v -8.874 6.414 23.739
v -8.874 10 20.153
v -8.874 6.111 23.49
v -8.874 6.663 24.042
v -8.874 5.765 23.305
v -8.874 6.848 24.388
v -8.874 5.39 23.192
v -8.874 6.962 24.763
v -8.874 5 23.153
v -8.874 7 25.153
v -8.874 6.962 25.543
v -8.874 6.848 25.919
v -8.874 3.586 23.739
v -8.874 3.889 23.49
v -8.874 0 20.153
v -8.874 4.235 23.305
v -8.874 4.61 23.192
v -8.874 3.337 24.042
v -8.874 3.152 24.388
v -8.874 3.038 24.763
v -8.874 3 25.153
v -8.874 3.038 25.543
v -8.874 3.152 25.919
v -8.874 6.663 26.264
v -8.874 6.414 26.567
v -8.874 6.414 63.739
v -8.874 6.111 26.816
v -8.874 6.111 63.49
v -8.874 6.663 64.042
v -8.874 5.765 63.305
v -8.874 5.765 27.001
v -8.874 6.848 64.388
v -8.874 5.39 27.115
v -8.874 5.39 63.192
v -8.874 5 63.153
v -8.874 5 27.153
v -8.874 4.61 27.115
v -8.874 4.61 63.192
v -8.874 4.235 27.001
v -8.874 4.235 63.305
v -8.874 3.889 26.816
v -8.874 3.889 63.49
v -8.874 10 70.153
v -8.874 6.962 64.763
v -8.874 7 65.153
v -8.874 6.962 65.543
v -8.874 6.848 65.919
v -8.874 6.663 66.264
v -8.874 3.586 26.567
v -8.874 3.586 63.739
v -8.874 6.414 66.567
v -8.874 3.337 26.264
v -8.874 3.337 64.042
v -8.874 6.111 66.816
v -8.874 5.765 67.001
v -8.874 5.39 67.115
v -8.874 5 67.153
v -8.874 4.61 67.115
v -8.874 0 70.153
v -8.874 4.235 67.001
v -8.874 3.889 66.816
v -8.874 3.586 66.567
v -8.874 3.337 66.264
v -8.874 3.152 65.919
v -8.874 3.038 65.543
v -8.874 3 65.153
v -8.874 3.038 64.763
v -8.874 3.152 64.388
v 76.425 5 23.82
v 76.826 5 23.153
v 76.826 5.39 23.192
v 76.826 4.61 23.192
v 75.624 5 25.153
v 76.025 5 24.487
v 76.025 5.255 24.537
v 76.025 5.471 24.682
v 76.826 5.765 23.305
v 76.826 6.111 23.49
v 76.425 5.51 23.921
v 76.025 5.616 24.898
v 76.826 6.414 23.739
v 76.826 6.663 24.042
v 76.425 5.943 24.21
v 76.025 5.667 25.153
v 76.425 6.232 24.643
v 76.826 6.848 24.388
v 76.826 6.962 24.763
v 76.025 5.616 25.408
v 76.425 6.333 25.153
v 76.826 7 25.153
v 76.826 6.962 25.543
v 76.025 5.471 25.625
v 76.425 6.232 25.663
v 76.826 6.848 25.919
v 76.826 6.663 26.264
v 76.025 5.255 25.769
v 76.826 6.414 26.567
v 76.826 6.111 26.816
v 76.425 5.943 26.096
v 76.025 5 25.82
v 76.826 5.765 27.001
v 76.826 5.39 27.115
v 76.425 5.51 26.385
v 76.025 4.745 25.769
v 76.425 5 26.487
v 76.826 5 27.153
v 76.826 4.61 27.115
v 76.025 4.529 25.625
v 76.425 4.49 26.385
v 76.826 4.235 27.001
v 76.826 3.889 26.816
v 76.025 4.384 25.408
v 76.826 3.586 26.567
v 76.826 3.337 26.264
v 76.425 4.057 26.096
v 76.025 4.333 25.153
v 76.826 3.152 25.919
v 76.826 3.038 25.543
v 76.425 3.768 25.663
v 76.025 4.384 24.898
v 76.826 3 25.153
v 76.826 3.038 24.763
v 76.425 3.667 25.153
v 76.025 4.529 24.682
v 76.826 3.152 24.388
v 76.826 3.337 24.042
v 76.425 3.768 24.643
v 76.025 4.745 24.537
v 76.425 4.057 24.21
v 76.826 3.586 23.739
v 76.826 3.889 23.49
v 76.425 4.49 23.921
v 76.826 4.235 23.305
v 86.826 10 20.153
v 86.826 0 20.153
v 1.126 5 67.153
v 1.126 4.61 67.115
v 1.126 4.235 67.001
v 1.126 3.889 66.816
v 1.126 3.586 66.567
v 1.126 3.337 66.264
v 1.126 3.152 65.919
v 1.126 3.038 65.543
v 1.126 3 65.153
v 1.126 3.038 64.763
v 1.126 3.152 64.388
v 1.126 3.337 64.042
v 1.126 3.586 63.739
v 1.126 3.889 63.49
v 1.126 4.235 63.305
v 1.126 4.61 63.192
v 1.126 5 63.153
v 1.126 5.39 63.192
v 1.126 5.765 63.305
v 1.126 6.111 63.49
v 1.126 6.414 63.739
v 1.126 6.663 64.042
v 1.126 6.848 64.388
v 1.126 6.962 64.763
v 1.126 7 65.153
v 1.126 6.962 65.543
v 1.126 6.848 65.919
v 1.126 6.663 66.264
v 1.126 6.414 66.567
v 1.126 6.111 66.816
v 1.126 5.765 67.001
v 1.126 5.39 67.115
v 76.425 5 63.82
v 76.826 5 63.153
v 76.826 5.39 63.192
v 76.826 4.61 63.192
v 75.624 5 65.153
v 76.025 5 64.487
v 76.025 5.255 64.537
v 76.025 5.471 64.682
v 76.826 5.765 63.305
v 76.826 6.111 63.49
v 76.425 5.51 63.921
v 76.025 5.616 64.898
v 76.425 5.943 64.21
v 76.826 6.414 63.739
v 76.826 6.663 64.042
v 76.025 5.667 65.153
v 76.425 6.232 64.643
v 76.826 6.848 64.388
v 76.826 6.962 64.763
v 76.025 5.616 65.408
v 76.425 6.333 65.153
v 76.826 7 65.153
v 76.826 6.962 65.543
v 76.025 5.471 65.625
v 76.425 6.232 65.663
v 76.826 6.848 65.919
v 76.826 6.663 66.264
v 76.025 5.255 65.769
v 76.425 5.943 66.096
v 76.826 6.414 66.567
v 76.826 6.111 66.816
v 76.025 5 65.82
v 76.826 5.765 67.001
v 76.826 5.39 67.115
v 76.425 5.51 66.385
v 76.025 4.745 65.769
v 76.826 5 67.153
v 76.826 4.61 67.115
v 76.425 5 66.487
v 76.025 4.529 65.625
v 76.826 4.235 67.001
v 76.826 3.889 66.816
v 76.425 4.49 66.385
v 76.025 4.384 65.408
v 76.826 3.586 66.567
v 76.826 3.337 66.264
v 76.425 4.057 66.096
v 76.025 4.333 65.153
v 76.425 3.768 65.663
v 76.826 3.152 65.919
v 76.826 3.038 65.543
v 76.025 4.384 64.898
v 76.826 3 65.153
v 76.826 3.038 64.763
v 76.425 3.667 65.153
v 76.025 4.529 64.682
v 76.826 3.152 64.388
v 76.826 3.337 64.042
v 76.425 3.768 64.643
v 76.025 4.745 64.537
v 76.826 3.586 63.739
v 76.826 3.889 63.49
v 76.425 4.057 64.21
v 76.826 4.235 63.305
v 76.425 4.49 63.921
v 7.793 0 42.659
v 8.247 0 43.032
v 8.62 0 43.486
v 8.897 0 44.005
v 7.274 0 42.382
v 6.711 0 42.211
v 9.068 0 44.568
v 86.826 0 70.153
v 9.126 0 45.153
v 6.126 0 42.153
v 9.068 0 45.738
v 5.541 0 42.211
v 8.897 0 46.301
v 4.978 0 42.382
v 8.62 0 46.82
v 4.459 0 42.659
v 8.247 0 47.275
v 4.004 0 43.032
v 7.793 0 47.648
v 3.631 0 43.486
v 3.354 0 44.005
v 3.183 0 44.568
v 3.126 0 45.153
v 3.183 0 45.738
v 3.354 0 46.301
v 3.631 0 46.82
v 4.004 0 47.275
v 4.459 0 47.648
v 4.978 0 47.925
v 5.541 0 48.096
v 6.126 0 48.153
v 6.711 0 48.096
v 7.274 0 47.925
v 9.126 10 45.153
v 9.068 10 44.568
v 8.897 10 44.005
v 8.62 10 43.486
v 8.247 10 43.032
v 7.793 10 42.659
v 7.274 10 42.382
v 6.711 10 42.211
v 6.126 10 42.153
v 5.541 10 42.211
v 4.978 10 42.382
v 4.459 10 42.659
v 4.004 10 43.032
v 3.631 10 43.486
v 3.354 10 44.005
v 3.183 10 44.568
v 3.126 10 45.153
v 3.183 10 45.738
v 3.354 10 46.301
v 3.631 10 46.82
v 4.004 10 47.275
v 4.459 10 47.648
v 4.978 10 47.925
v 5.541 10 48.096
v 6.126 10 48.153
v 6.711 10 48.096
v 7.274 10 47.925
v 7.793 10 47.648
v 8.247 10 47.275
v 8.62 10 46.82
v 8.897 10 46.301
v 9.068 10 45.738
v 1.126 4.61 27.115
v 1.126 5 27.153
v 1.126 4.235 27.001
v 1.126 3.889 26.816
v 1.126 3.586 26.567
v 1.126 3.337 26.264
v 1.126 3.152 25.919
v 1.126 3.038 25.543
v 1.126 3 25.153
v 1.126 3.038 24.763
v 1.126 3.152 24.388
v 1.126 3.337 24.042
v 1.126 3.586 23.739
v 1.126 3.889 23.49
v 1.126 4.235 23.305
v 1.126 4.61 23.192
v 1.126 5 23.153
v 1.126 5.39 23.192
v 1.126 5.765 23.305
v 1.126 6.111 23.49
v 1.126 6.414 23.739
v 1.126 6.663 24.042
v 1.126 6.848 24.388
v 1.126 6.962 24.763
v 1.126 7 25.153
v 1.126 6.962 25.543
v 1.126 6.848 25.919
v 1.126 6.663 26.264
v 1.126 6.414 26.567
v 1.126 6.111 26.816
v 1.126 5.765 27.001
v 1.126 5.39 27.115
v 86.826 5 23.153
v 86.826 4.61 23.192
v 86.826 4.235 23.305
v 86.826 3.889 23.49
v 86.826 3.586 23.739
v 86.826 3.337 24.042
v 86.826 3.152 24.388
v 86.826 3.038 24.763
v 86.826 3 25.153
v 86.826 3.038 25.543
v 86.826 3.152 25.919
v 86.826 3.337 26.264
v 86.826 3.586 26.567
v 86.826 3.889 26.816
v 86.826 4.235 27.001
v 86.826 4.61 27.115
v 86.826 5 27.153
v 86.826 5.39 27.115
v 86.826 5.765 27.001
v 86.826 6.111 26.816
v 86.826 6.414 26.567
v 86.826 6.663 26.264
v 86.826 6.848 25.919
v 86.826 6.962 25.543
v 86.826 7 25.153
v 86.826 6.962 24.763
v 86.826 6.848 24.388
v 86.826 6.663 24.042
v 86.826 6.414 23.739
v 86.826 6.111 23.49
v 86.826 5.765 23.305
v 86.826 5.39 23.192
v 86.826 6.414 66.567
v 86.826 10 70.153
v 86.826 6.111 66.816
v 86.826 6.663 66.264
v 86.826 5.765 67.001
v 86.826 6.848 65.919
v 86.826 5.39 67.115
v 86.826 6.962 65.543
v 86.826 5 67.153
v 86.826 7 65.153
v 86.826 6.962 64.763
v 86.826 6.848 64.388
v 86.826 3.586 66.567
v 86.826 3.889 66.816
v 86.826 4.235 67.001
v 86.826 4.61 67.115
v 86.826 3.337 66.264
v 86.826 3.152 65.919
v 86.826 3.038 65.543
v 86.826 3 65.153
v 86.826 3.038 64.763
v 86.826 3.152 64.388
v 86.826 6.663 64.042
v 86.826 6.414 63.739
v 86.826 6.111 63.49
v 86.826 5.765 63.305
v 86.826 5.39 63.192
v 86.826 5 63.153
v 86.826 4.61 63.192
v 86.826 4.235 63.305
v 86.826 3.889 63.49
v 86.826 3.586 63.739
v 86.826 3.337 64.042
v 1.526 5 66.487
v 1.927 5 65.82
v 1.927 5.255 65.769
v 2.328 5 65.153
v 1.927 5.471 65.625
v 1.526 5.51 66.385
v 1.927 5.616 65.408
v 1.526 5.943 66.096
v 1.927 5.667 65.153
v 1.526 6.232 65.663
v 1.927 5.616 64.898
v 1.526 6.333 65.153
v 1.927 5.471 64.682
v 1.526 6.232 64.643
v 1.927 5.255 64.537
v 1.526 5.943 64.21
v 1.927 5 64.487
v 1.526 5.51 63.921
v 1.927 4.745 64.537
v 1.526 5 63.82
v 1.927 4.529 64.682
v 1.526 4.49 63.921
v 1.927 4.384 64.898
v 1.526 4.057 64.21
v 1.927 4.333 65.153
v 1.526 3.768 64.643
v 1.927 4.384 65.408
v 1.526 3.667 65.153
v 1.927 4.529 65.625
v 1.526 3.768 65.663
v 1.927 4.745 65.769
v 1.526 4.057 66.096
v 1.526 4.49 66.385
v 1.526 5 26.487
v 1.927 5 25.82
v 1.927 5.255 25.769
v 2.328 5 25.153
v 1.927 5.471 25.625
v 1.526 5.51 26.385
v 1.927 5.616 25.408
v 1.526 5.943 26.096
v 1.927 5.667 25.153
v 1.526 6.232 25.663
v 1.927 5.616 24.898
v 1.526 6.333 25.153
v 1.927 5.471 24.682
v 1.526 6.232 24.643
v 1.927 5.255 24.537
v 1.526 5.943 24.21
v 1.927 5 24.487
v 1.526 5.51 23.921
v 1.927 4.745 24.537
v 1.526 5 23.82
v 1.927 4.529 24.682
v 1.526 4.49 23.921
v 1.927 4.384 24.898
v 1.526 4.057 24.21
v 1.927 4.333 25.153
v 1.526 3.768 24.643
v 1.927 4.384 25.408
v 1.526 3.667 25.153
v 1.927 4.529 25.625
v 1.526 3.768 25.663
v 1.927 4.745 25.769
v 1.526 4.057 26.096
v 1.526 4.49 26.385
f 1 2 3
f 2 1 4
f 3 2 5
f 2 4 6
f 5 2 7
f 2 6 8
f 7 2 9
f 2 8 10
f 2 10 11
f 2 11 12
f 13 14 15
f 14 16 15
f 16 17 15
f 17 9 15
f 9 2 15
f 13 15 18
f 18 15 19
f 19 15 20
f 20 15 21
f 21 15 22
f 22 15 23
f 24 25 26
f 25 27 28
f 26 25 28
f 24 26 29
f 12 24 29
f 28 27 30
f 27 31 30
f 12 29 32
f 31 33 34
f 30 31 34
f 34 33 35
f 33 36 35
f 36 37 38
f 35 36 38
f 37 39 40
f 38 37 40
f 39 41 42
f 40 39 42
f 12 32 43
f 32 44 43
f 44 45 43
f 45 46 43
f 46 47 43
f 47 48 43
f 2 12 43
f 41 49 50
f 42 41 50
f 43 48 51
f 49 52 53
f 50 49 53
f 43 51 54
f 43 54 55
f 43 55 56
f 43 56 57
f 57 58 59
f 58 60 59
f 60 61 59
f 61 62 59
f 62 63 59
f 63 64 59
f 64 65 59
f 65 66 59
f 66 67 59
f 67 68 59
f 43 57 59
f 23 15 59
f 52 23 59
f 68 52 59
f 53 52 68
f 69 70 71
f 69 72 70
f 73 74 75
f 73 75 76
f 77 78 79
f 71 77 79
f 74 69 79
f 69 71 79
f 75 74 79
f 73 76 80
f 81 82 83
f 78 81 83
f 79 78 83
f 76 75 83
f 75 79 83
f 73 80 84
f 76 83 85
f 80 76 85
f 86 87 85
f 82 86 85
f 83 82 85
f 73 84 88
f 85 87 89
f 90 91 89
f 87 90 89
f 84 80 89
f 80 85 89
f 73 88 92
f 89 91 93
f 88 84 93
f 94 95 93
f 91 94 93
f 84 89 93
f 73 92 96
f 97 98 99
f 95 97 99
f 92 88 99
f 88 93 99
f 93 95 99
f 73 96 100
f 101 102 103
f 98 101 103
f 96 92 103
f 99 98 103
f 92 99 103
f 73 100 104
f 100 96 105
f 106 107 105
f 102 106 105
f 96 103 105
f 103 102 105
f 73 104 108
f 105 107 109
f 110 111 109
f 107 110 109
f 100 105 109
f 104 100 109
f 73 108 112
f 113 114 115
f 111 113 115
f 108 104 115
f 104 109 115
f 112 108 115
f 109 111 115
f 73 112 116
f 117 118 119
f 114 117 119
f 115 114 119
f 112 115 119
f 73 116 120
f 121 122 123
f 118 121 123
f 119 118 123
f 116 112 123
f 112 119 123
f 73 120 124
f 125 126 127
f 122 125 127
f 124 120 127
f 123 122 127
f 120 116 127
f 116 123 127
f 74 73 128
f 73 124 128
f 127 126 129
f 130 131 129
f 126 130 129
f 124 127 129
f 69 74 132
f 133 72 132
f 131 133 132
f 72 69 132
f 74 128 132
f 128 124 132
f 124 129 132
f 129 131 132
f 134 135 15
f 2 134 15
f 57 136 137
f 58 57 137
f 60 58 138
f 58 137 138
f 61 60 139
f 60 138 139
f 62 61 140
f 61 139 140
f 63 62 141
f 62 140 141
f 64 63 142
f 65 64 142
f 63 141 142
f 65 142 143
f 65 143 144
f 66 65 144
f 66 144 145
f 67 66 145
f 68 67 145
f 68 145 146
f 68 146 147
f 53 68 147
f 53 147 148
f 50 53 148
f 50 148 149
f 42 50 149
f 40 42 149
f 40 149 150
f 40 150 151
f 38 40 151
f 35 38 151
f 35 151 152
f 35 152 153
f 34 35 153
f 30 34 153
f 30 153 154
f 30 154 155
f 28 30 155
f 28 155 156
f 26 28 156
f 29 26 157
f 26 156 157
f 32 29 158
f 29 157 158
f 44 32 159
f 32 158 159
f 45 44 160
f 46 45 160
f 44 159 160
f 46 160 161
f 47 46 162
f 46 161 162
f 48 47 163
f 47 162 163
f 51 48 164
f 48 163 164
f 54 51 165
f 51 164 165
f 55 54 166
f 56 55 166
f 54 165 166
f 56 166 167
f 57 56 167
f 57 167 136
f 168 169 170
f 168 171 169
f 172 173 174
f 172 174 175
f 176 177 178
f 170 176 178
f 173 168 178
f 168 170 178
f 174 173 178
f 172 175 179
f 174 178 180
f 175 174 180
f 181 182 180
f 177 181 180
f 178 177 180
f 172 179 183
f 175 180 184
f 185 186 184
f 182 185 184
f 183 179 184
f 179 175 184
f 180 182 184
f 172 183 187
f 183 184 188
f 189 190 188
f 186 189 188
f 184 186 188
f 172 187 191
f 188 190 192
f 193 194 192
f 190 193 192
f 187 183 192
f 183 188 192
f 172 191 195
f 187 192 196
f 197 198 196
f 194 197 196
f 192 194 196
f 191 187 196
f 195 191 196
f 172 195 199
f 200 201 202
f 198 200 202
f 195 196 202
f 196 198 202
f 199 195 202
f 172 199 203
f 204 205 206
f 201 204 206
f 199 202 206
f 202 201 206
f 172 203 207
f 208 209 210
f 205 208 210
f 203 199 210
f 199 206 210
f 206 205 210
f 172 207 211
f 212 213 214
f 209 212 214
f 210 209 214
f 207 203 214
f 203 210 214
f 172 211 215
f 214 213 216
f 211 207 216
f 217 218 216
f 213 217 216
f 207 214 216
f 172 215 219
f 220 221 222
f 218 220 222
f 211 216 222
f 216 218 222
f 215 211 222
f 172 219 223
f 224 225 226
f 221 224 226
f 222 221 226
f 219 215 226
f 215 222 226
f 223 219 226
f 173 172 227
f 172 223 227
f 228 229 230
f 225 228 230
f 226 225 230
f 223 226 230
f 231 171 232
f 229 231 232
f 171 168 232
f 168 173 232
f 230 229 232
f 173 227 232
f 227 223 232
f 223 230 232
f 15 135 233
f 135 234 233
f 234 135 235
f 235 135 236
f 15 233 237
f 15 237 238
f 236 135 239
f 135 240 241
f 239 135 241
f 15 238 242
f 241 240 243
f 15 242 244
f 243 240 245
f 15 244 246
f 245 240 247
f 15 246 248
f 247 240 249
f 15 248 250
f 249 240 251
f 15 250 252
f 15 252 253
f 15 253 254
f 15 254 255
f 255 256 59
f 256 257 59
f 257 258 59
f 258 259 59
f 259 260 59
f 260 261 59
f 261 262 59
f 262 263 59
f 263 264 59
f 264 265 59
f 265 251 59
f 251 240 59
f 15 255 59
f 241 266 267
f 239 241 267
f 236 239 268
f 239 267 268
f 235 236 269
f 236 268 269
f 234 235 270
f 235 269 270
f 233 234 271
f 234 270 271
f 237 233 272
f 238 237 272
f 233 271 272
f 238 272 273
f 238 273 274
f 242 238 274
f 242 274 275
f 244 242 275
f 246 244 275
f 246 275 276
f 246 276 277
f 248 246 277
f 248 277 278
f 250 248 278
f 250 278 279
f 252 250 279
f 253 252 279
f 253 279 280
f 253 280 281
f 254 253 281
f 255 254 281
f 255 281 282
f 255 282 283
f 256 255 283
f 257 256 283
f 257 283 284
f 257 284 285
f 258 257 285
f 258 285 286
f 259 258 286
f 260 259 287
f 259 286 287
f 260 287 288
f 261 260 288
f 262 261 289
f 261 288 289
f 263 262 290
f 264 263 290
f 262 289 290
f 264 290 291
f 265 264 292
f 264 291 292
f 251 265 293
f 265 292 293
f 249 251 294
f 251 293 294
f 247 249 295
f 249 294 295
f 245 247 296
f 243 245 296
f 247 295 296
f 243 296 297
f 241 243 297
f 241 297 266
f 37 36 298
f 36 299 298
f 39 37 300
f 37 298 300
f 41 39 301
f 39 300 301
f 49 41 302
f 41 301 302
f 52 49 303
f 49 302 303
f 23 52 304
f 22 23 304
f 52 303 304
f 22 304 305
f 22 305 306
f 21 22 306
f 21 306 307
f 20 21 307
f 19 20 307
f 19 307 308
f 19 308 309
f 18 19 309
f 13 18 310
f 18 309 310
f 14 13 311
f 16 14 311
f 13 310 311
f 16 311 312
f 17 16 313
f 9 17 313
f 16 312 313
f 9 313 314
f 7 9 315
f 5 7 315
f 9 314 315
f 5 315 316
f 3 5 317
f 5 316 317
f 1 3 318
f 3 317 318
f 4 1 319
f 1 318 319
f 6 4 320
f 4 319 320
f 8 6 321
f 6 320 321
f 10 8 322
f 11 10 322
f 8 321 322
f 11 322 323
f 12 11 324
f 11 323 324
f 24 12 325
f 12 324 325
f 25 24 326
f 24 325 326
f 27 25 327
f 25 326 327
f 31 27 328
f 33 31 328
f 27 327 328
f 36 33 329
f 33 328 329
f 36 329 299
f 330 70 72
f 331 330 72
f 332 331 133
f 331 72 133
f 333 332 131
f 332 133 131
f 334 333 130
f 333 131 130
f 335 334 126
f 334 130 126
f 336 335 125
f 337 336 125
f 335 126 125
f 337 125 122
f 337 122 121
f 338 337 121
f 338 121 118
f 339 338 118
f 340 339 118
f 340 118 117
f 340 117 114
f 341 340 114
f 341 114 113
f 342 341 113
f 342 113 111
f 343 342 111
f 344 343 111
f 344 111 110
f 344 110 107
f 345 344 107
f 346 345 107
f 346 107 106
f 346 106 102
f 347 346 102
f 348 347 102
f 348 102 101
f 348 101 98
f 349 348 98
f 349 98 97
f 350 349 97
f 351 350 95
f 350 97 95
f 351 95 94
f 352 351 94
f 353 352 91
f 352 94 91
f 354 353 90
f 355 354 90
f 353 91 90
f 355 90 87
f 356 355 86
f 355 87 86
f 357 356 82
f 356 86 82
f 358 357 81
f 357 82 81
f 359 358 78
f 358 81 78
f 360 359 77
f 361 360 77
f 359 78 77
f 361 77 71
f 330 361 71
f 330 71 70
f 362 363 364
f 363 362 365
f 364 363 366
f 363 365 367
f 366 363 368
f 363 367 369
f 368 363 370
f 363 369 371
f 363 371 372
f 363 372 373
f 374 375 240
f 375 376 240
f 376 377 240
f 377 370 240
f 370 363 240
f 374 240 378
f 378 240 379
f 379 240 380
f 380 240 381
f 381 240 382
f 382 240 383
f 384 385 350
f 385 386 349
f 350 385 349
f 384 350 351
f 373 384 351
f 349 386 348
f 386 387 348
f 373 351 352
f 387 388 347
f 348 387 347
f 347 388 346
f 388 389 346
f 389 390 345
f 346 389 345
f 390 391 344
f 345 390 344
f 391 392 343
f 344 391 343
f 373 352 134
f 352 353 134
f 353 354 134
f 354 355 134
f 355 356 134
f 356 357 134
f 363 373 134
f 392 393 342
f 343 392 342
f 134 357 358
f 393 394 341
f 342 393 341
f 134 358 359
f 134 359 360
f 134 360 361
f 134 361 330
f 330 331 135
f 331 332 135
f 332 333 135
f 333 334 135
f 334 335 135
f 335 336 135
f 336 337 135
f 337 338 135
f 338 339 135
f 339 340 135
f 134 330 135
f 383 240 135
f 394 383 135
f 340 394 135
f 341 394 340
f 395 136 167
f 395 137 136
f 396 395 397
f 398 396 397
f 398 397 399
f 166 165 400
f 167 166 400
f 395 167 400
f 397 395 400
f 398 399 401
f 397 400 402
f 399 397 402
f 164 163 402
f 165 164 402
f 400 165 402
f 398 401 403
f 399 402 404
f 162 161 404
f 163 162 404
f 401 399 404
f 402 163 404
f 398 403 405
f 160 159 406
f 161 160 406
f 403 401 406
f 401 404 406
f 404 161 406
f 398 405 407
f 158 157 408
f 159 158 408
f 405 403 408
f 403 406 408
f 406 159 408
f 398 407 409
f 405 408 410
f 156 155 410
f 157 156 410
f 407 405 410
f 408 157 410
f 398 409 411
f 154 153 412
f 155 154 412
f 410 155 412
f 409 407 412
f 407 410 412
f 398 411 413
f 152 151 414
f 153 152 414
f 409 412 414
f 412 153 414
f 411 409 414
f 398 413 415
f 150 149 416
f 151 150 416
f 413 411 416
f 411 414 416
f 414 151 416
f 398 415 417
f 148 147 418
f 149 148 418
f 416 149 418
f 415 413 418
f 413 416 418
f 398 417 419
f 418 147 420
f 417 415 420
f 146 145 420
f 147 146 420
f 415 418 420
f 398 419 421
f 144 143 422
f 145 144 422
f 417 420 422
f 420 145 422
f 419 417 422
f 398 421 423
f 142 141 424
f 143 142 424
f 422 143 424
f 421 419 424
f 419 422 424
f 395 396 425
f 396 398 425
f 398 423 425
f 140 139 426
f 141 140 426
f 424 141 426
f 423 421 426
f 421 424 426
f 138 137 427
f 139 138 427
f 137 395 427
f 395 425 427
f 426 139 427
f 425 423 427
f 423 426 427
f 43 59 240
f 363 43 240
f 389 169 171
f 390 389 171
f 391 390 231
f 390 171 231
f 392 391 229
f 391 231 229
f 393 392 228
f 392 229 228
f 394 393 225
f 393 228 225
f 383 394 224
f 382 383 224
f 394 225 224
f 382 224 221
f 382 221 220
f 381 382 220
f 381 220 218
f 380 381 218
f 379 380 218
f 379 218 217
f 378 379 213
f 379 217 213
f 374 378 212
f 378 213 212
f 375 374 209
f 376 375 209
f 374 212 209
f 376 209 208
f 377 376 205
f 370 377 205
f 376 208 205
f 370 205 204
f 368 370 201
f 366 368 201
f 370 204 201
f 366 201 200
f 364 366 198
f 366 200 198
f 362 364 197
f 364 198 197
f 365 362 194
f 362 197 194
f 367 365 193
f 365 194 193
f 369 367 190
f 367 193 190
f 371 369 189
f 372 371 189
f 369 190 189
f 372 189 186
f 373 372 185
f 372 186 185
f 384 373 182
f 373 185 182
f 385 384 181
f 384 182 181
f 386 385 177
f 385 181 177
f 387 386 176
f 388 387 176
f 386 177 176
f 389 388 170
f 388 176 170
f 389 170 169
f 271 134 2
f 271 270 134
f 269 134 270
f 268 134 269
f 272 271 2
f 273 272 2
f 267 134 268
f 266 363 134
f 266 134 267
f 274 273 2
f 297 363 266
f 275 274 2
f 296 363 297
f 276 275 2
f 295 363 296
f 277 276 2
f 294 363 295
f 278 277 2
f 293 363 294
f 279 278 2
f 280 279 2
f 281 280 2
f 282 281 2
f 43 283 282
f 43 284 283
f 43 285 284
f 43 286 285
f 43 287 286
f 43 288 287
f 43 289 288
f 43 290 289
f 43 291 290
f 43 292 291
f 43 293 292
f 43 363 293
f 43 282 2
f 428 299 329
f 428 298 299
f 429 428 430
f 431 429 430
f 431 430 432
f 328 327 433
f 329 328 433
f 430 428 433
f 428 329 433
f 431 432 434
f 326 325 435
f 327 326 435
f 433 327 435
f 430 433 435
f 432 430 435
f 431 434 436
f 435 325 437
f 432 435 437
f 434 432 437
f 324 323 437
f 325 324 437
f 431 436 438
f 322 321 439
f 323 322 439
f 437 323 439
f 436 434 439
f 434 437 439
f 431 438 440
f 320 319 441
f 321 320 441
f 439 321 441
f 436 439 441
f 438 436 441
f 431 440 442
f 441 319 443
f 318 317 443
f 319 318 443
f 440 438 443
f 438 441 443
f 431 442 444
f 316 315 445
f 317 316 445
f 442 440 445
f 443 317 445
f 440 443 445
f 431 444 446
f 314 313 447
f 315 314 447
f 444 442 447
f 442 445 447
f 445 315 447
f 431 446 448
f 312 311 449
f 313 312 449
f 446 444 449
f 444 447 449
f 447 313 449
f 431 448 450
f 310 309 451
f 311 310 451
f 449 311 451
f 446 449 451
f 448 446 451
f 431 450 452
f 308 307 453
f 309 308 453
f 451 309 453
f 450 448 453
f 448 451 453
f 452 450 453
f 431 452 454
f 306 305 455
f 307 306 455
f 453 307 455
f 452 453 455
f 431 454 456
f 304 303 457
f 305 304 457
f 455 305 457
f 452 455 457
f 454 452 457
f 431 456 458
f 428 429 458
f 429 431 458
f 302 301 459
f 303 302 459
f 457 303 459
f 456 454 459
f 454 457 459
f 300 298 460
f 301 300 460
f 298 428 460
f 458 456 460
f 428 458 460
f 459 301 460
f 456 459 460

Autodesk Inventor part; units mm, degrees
ref_plane "YZ Plane" through (0, 0, 0) normal (1, 0, 0) x (0, 1, 0)
ref_plane "XZ Plane" through (0, 0, 0) normal (0, 1, 0) x (-1, 0, 0)
ref_plane "XY Plane" through (0, 0, 0) normal (0, 0, 1) x (1, 0, 0)
sketch "Boceto1" plane through (0, 0, 0) normal (0, 1, 0) x (-1, 0, 0)
  line L0 (8.8742, 70.1532) -> (-86.8258, 70.1532)
  line L1 (-86.8258, 70.1532) -> (-86.8258, 20.1532)
  line L2 (-86.8258, 20.1532) -> (8.8742, 20.1532)
  line L3 (8.8742, 20.1532) -> (8.8742, 70.1532)
  dimension "d0" = 95.7
  dimension "d1" = 50
extrude "Extrusión1" add sketch "Boceto1" along normal blind 10
sketch "Boceto2" plane through (86.8258, 0, 70.1532) normal (1, 0, 0) x (0, 0, -1)
  line L0 (0, 0) -> (0, 10) projected
  line L1 (50, 0) -> (50, 10) projected
  circle A0 centre (5, 5) radius 2
  circle A1 centre (45, 5) radius 2
  point P0 (70.1532, 0)
  dimension "d4" = 4
  dimension "d5" = 5
  dimension "d6" = 4
  dimension "d7" = 5
sketch "Boceto3" plane through (-8.8742, 0, 20.1532) normal (-1, 0, 0) x (0, 0, 1)
  circle A0 centre (5, 5) radius 2
  line L0 (0, 10) -> (50, 10) projected
  line L1 (0, 0) -> (0, 10) projected
  circle A1 centre (45, 5) radius 2
  line L2 (50, 0) -> (50, 10) projected
  dimension "d8" = 4
  dimension "d9" = 5
  dimension "d10" = 5
  dimension "d11" = 4
  dimension "d12" = 5
  dimension "d13" = 5
hole "Agujero1" at (-8.8742, 5, 25.1532) at (-8.8742, 5, 65.1532) direction (1, 0, 0) diameter 4 depth 10 tip angle 118
hole "Agujero2" at (86.8258, 5, 65.1532) at (86.8258, 5, 25.1532) direction (-1, 0, 0) diameter 4 depth 10 tip angle 118
thread "Rosca1" size "M4x0.7" class "6H" standard "ISO Metric profile" length 7.5
thread "Rosca2" size "M4x0.7" class "6H" standard "ISO Metric profile" length 7.5
thread "Rosca3" size "M4x0.7" class "6H" standard "ISO Metric profile" length 7.5
thread "Rosca4" size "M4x0.7" class "6H" standard "ISO Metric profile" length 7.5
sketch "Sketch4" plane through (0, 10, 0) normal (0, 1, 0) x (1, 0, 0)
  circle A0 centre (6.1258, -45.1532) radius 3
  line L0 (-8.8742, -20.1532) -> (-8.8742, -70.1532) projected
  dimension "d36" = 6
  dimension "d37" = 15
extrude "Extrusion2" cut sketch "Sketch4" against normal blind 10
properties part number "Soporte para Culata Carcasa Izquierdo" material "Aluminio 6061"
